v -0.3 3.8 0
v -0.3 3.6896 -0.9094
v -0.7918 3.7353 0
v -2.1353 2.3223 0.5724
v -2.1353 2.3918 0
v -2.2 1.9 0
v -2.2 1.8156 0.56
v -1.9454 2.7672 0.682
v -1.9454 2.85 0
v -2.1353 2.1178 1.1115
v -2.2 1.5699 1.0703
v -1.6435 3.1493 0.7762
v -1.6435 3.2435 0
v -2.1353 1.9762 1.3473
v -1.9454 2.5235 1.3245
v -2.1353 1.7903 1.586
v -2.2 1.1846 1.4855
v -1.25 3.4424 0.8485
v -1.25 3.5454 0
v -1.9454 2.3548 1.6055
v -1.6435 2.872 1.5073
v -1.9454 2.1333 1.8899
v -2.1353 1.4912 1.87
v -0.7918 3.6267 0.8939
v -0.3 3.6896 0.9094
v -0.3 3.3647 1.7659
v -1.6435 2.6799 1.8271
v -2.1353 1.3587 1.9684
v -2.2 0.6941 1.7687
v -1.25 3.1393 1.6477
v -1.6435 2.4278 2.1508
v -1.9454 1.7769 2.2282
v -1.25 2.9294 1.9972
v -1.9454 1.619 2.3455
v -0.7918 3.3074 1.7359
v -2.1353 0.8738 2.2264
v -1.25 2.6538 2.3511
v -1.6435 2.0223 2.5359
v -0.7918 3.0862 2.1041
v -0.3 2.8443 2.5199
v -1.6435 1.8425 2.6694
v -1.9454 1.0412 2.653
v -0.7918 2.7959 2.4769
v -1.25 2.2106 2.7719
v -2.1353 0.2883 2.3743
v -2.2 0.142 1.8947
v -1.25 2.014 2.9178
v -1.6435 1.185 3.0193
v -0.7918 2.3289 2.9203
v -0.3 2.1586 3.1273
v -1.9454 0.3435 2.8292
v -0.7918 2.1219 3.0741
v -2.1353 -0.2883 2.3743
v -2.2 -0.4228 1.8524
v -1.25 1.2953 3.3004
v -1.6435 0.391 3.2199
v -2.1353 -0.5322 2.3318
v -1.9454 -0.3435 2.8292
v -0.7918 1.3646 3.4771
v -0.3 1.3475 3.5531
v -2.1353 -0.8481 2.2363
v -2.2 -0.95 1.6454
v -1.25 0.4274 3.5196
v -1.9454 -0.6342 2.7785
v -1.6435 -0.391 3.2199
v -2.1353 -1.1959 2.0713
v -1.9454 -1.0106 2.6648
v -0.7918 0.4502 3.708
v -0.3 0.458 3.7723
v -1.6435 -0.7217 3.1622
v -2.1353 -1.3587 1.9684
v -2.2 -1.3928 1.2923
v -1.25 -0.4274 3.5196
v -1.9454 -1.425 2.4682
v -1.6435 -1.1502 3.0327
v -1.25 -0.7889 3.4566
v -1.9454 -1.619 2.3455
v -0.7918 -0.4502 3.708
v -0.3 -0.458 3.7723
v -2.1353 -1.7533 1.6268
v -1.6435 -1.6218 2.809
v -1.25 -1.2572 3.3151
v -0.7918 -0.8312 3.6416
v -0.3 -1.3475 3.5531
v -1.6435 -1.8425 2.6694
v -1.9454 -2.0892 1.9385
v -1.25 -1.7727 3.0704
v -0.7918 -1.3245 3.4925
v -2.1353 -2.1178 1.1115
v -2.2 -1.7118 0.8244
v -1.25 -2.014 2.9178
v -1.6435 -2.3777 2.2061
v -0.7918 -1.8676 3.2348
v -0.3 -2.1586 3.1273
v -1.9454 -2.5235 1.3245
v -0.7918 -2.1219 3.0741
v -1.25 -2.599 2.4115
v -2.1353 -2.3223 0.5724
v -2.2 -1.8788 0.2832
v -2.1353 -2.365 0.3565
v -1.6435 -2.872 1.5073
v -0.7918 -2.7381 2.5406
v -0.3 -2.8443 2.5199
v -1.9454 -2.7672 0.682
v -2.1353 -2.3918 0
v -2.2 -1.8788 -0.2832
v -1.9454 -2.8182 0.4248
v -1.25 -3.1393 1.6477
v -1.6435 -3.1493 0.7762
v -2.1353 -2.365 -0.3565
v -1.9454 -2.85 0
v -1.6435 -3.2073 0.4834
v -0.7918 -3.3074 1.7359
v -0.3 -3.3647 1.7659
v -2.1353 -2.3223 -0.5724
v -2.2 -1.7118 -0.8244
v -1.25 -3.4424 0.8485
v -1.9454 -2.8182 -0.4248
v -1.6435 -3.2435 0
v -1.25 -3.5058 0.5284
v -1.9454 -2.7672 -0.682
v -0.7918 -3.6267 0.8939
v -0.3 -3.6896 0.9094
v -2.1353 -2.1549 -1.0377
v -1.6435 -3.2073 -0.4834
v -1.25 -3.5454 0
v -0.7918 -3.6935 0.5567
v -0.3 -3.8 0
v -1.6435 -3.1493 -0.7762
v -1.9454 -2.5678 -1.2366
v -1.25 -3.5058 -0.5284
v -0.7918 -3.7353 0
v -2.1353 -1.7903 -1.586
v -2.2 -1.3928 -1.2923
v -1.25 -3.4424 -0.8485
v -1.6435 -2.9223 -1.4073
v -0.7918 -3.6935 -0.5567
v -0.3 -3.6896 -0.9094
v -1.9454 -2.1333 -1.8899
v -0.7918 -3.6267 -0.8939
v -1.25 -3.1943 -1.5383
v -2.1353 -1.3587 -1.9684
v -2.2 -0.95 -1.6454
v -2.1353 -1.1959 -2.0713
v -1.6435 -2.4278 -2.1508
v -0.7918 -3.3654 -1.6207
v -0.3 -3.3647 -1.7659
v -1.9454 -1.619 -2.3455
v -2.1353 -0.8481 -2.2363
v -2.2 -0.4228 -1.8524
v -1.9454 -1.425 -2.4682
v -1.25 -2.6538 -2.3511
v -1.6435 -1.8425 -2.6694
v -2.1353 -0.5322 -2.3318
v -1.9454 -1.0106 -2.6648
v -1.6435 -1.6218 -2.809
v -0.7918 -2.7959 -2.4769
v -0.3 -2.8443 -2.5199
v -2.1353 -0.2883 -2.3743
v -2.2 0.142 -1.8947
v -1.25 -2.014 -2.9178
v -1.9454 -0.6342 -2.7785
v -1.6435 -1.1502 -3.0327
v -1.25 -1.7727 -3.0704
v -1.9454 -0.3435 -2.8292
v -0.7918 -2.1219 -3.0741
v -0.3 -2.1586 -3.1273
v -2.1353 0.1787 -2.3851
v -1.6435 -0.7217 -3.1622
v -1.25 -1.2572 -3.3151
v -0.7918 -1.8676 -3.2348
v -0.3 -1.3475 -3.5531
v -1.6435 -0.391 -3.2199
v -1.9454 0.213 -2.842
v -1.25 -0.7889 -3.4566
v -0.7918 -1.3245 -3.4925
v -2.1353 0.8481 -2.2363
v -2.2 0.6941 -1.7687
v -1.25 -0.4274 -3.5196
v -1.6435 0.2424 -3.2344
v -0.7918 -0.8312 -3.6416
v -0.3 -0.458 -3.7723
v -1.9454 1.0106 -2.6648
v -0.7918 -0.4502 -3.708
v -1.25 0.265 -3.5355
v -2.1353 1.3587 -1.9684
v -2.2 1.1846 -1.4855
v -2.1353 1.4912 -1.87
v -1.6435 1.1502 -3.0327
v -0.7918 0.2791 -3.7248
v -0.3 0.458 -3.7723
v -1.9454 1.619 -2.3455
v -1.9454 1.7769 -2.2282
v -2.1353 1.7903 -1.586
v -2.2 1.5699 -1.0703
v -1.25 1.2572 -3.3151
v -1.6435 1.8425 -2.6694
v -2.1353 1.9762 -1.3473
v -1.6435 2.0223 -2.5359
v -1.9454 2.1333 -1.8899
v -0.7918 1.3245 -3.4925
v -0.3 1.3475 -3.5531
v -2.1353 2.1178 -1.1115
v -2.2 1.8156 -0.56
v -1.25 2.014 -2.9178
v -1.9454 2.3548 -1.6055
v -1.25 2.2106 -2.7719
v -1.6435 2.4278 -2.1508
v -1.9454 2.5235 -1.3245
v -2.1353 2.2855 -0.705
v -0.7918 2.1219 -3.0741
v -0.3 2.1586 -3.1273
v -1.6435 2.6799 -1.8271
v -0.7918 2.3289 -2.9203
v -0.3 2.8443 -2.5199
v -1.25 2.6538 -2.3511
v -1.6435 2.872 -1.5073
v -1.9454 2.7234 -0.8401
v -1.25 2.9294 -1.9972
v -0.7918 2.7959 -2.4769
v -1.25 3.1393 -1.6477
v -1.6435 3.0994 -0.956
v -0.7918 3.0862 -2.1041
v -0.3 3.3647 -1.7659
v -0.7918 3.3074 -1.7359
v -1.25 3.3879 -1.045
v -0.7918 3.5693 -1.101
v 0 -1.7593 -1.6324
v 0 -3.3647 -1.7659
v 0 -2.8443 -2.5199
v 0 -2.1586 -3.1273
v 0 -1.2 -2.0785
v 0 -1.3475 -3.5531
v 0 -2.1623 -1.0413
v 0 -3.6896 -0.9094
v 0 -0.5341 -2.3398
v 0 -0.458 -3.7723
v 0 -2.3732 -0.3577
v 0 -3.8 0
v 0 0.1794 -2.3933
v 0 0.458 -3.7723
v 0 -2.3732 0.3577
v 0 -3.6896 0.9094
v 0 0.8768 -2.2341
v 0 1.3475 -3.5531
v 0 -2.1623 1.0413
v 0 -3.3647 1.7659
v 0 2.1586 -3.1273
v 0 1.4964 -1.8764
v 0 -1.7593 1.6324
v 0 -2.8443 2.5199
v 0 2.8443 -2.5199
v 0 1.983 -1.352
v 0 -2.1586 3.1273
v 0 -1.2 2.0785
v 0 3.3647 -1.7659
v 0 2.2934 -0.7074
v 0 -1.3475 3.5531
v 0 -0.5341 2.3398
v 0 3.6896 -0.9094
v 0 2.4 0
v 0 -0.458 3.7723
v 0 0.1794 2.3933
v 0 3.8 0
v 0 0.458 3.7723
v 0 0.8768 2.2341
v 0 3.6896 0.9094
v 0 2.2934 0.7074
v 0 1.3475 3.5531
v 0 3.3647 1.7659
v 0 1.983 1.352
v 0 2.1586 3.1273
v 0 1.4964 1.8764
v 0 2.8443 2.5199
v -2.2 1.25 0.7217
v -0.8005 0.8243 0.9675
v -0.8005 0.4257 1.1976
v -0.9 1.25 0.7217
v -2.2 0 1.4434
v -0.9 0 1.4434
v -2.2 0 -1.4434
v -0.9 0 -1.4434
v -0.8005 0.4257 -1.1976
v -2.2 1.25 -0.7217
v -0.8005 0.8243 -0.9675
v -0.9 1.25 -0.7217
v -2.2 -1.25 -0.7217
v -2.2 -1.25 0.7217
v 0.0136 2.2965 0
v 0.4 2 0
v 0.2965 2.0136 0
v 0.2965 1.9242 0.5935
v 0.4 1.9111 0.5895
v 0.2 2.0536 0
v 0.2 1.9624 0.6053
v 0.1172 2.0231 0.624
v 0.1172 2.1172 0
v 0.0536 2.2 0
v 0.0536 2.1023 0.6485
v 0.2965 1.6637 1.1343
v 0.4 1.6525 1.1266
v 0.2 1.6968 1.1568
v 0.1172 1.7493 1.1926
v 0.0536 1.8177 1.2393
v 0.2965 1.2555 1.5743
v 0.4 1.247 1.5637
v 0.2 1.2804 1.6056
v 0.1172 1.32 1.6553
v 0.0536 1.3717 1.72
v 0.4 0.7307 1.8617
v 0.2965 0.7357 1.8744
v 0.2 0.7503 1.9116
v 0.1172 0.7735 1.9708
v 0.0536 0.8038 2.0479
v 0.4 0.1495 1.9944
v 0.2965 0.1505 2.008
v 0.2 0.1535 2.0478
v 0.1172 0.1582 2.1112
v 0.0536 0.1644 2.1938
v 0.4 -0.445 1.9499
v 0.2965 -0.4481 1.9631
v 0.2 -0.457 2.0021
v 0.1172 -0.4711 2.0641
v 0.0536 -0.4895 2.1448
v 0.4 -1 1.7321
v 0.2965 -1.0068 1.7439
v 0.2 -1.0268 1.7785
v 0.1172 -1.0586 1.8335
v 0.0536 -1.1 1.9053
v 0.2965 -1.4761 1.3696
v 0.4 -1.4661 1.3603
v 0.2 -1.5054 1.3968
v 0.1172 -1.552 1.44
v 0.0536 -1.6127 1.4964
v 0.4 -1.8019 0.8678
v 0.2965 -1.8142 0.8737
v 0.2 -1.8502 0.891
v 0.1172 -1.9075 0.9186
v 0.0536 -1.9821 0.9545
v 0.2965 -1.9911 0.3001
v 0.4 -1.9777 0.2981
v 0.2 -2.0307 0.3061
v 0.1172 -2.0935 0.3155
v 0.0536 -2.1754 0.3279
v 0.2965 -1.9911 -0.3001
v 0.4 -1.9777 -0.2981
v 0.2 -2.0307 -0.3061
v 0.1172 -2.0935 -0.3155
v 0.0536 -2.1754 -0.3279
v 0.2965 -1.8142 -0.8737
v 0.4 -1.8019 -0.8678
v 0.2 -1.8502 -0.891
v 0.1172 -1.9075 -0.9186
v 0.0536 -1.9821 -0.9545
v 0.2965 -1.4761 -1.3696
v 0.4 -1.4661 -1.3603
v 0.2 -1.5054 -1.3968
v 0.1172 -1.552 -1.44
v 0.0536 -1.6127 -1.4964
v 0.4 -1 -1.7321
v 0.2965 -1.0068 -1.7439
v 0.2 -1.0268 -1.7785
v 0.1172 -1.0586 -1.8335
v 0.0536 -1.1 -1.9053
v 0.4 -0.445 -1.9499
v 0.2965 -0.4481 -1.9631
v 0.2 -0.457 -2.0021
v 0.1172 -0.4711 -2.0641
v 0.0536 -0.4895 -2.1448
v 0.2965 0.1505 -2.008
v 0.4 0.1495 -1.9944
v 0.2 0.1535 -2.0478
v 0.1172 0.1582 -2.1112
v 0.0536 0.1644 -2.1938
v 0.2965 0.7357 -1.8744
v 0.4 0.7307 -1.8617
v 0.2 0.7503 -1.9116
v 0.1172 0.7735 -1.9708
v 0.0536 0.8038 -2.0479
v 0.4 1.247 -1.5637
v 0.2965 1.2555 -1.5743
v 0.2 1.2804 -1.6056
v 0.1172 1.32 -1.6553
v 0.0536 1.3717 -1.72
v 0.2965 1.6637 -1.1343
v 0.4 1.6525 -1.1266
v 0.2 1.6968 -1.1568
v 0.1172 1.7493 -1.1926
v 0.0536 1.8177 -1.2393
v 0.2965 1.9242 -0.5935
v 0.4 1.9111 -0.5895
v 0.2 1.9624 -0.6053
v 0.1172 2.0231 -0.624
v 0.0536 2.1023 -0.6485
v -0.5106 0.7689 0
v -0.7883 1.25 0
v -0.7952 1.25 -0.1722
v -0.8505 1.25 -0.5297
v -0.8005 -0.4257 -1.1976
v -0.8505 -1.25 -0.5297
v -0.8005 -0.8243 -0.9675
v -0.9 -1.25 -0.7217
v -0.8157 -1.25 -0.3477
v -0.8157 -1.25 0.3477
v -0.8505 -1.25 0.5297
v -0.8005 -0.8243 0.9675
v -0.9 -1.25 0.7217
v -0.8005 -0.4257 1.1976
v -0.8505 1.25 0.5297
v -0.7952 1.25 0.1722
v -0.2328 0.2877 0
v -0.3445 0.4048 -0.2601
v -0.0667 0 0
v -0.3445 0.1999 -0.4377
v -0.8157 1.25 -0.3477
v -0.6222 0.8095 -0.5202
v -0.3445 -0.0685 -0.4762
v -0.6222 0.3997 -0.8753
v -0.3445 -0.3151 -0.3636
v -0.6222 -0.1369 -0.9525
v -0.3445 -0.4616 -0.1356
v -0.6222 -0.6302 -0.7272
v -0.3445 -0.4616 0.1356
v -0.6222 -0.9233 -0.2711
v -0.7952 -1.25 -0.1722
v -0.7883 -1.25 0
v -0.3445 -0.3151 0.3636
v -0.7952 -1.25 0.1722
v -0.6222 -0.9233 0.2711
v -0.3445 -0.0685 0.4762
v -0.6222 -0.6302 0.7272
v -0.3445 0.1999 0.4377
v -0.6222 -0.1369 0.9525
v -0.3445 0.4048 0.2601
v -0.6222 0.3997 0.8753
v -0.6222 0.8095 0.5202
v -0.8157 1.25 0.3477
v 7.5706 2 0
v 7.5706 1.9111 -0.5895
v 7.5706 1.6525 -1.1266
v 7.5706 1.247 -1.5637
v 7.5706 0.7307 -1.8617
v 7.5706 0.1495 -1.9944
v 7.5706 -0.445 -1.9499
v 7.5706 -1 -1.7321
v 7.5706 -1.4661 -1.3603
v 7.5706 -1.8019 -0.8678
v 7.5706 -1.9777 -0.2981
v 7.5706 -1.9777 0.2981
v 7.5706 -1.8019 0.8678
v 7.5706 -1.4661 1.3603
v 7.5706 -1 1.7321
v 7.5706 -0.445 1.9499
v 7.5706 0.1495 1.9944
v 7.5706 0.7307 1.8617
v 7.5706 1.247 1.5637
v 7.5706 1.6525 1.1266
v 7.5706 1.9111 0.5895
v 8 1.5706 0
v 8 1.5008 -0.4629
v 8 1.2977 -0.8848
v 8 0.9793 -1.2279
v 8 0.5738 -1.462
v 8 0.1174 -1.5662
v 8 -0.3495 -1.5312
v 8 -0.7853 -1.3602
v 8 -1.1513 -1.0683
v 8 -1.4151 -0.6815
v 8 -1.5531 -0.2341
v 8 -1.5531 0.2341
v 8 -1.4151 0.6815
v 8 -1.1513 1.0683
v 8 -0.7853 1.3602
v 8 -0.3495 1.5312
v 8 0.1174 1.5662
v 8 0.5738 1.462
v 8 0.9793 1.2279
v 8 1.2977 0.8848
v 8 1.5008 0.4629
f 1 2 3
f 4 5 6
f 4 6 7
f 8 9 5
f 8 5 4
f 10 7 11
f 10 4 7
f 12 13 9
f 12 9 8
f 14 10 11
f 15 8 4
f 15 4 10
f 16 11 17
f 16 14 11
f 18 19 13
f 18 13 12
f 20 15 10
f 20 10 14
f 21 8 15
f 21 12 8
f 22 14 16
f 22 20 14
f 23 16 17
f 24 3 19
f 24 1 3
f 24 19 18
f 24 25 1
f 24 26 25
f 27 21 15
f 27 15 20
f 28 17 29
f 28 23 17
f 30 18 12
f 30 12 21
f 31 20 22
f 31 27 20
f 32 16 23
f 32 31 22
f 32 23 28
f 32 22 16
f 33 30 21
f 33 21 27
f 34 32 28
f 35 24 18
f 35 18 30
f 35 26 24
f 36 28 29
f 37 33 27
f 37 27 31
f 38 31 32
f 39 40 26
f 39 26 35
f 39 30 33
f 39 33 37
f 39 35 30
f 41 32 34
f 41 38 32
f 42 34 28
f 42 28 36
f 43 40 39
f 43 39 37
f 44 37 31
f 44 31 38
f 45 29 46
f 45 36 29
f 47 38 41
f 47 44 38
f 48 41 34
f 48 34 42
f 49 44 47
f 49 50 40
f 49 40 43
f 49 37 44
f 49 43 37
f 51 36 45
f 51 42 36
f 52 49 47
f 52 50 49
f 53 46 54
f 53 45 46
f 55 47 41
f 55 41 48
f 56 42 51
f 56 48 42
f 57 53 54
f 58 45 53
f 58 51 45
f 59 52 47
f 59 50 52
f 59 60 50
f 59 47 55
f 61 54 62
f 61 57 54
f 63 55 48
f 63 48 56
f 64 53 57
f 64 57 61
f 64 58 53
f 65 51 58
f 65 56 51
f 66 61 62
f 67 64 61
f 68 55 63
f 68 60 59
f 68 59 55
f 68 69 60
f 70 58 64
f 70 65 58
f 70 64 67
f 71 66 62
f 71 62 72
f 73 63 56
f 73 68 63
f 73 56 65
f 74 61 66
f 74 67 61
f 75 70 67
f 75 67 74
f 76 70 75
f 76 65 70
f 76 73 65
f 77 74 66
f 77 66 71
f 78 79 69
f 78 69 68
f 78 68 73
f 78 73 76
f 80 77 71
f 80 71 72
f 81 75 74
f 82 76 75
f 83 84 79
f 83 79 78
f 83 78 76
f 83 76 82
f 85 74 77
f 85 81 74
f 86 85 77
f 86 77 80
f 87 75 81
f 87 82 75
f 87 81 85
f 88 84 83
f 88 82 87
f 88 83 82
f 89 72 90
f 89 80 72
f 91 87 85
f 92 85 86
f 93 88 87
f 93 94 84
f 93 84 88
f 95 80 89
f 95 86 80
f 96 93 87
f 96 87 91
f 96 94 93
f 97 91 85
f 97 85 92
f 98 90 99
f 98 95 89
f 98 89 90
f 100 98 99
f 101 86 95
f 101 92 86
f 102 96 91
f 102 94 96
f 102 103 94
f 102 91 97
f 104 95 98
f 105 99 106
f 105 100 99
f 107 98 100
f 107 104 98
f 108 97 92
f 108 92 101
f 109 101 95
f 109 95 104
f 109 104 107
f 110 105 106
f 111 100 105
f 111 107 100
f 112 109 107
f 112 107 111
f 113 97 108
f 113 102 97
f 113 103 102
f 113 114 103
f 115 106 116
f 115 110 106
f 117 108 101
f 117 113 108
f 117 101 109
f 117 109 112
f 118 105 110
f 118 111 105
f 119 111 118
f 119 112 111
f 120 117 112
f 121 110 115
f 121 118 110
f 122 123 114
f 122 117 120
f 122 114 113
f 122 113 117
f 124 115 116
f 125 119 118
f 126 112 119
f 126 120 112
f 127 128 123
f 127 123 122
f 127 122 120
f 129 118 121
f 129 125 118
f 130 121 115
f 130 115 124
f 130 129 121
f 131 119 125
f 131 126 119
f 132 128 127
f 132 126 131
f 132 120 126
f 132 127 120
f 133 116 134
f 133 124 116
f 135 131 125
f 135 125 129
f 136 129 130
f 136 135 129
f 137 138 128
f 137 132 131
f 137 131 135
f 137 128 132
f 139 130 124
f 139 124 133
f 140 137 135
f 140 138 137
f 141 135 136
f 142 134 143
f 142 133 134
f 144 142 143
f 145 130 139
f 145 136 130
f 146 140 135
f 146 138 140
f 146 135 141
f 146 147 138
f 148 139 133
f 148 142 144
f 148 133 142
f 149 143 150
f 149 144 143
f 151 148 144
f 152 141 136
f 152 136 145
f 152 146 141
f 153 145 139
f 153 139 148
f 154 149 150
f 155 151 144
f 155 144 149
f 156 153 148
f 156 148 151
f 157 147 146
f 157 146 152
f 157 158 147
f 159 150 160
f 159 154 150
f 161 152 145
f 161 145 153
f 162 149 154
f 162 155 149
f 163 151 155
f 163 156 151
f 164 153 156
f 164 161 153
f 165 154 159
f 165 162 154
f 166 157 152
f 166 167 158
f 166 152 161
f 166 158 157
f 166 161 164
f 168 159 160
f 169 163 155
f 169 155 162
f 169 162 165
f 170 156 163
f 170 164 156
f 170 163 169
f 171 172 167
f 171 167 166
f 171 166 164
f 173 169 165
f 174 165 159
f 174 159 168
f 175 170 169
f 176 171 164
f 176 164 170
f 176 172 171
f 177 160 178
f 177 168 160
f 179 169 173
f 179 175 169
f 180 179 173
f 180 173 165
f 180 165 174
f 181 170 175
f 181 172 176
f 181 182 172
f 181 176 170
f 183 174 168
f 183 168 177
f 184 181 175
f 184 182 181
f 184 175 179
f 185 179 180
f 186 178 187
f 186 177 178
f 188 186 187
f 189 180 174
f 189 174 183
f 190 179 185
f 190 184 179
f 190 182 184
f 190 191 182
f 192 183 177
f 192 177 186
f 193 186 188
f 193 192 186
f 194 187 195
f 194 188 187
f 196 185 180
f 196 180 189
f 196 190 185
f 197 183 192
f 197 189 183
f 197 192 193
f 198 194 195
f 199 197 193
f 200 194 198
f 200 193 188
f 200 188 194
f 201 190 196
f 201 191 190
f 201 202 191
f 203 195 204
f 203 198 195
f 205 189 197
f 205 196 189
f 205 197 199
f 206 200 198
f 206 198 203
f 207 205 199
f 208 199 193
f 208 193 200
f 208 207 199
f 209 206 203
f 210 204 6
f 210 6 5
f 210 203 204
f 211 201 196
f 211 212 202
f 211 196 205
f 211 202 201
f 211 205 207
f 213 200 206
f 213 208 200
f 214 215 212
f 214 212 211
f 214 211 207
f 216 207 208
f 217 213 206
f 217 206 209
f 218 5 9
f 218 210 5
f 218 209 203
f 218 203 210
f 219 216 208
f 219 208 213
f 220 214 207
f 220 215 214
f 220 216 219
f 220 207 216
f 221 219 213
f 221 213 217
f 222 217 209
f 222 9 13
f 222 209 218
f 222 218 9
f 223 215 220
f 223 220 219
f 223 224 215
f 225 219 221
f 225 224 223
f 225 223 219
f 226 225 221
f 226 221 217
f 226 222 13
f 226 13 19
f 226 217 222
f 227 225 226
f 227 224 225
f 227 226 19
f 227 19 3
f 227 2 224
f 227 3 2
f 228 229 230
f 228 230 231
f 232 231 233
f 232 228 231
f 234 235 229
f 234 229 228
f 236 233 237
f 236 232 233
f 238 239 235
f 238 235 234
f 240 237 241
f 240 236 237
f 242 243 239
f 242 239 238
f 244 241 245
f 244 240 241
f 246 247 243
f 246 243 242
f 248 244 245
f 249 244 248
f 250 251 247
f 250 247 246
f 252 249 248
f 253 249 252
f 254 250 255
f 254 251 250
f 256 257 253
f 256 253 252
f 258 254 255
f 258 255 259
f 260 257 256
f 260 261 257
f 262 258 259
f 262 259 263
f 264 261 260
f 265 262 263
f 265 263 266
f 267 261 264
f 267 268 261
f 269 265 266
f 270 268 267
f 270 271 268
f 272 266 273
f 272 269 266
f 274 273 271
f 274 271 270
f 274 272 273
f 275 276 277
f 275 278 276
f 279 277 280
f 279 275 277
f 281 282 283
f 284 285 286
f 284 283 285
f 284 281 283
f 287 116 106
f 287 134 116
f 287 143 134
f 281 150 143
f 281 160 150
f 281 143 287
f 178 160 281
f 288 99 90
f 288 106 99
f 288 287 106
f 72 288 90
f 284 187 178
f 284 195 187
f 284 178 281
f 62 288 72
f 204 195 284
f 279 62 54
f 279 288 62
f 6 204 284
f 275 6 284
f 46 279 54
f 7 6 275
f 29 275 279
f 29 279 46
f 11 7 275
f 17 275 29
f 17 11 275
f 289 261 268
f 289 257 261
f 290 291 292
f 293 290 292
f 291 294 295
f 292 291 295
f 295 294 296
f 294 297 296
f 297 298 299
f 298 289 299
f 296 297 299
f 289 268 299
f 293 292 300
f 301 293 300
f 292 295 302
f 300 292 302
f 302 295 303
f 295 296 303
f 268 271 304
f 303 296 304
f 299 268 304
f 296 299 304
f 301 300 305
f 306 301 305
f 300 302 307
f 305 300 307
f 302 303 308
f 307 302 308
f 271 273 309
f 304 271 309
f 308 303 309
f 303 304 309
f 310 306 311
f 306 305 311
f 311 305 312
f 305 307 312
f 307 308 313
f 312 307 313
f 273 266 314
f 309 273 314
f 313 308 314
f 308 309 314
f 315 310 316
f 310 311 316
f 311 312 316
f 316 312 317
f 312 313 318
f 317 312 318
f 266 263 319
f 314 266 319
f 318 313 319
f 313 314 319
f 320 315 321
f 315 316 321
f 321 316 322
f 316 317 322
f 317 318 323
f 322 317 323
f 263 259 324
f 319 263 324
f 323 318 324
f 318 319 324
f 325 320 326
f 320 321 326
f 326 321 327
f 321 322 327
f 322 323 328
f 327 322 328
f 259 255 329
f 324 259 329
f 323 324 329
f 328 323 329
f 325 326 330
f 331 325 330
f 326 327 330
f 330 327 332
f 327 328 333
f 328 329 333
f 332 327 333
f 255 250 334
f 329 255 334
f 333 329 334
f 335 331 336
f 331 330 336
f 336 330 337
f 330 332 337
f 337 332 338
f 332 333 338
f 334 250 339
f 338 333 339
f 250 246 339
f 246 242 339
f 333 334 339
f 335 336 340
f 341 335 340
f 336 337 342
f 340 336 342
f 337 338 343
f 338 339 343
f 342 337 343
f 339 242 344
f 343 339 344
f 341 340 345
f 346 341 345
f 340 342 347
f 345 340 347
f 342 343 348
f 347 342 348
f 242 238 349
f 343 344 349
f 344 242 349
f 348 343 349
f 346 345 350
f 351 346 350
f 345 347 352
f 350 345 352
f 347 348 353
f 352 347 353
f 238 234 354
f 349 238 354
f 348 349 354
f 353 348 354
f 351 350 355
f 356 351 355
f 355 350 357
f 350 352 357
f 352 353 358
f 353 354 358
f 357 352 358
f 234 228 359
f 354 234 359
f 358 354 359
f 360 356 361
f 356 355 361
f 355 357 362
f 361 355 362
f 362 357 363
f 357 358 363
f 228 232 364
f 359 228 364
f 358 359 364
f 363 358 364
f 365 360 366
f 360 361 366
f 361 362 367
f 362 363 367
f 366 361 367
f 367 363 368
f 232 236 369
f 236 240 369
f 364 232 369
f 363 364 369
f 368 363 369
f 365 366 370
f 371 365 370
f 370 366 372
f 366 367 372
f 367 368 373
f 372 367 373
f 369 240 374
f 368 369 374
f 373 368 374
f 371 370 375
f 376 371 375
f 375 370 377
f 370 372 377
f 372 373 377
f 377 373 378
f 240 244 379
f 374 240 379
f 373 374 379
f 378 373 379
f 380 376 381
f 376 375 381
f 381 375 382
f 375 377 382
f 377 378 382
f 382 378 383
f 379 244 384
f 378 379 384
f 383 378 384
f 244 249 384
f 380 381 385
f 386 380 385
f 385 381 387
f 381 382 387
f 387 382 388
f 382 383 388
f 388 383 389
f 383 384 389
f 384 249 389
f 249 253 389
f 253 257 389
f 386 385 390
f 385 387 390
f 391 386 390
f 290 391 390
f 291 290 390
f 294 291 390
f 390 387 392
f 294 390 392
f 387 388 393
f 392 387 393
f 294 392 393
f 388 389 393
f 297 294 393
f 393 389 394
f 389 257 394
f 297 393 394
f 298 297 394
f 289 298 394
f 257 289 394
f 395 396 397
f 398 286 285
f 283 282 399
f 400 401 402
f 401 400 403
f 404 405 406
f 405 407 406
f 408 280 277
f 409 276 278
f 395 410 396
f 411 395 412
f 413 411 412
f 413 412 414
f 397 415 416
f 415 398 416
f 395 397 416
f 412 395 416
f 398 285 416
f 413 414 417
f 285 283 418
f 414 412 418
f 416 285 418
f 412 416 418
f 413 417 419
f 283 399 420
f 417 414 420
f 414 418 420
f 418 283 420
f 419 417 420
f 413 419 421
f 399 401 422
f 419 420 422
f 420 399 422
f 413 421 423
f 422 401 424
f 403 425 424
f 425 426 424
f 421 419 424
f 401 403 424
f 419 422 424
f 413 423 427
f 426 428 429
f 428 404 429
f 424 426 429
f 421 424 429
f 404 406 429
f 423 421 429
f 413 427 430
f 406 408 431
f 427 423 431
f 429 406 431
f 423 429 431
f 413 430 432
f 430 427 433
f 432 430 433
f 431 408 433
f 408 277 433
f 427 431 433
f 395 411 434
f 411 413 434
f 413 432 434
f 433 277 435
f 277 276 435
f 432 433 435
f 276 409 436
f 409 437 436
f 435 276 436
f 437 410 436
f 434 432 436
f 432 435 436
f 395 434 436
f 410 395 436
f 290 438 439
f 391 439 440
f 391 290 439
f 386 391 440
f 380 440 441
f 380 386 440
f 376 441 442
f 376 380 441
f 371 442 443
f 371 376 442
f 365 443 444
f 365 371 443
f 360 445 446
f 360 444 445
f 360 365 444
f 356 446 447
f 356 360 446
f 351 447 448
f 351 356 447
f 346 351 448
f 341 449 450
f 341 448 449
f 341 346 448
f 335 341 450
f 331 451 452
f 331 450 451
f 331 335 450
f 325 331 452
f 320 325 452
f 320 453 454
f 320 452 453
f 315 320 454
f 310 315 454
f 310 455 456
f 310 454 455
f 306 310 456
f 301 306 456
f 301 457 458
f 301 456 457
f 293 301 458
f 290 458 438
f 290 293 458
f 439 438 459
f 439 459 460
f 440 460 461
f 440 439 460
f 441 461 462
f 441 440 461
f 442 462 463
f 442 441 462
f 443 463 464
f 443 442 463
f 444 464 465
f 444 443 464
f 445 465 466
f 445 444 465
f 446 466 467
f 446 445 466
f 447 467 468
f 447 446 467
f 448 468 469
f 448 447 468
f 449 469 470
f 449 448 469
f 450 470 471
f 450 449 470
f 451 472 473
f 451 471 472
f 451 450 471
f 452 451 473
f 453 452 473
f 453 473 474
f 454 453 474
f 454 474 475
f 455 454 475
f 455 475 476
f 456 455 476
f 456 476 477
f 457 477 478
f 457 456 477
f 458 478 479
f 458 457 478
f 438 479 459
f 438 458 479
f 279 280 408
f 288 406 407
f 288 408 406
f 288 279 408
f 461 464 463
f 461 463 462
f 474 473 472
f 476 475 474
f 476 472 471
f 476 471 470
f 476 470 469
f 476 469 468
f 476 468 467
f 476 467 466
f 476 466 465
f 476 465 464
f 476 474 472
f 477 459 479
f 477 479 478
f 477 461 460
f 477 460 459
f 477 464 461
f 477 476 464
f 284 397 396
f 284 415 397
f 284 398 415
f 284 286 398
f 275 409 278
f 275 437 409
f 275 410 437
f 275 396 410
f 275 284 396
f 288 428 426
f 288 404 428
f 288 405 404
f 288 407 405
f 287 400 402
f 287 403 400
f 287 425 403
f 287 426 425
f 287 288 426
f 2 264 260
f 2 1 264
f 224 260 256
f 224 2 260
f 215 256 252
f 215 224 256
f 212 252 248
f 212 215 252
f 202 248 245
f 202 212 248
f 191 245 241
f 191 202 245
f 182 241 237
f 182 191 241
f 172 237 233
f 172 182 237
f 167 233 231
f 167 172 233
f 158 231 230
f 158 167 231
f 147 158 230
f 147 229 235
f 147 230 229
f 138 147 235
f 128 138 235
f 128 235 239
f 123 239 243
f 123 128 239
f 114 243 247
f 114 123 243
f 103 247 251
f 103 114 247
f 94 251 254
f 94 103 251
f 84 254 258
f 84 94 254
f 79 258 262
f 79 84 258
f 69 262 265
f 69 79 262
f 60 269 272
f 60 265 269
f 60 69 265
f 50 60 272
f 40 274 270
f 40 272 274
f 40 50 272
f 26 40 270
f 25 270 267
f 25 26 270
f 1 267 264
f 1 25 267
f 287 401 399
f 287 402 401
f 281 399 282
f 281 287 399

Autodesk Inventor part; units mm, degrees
ref_plane "YZ Plane" through (0, 0, 0) normal (1, 0, 0) x (0, 1, 0)
ref_plane "XZ Plane" through (0, 0, 0) normal (0, 1, 0) x (-1, 0, 0)
sketch "Sketch1" plane through (0, 0, 0) normal (0, 0, 1) x (1, 0, 0)
  line L0 (-0.0667, 0) -> (8, 0)
  line L1 (8, 0) -> (8, 2)
  line L2 (8, 2) -> (2.1, 2)
  line L3 (2.1, 2) -> (1.6705, 2)
  line L4 (1.6705, 2) -> (0, 2)
  line L5 (0, 2) -> (0, 3.8)
  line L6 (0, 3.8) -> (-2.2, 3.8)
  line L7 (-2.2, 3.8) -> (-2.2, 1.4434)
  line L8 (-2.2, 1.4434) -> (-0.9, 1.4434)
  line L9 (-0.9, 1.4434) -> (-0.0667, 0)
  line L10 (-4.24, 0) -> (10.04, 0) projected
  line L11 (0, -0.76) -> (0, 4.56) projected
  line L12 (2.1, 2) -> (0, 2) construction
  dimension "d1" = 5.9
  dimension "d2" = 0.4295
  dimension "d3" = 2.2
  dimension "d4" = 1.3
  dimension "d5" = 60
  dimension "d6" = 4
  dimension "d7" = 4
  dimension "d8" = 2.8868
  dimension "d9" = 7.6
  dimension "d26" = 8
revolve "Body" add sketch "Sketch1" angle 360 about axis through (-0.0667, 0, 0) along (1, 0, 0)
sketch "Sketch2" plane through (-2.2, 0, 0) normal (-1, 0, 0) x (0, 0, 1)
  circle A0 centre (0, 0) radius 1.4434 projected
  line L0 (0, -5.32) -> (0, 5.32) projected
  line L1 (-5.32, 0) -> (5.32, 0) projected
  line L2 (1.4434, 0) -> (0.7217, -1.25)
  line L3 (0.7217, -1.25) -> (-0.7217, -1.25)
  line L4 (-0.7217, -1.25) -> (-1.4434, 0)
  line L5 (-1.4434, 0) -> (-0.7217, 1.25)
  line L6 (-0.7217, 1.25) -> (0.7217, 1.25)
  line L7 (0.7217, 1.25) -> (1.4434, 0)
  point P0 (0, 0)
extrude "Slot" add sketch "Sketch2" against normal up to next contours L7 A0 | A0 L2 | L6 L0 A0 | A0 L0 L3 | L0 L6 A0 | A0 L3 L0 | L4 A0 | A0 L5
fillet "Fillet1" radius 1.9 1 edges at (-2.2, -3.8, 0)
thread "Thread" size "M4x0.7" class "6g" standard "ISO Metric profile" length 5.9
chamfer "Chamfer1" distance 0.4294 distance2 0.4294 1 edges at (8, -2, 0) measured on face at (8, 0.556, 0.0273)
ref_plane "Work Plane1" through (29, 0, 0) normal (0, -1, 0) x (1, 0, 0)
fillet "Fillet2" radius 0.4 1 edges at (0, -2, 0)
equation "\"d1\" = GEL"
equation "\"d3\" = KOH"
equation "\"d4\" = INTI"
equation "\"d6\" = GD"
equation "\"d7\" = BDM"
equation "\"d8\" = 1.1547 * SW"
equation "\"d9\" = KOD"
equation "\"d26\" = NLG"
equation "\"d30\" = R"
equation "\"d17\" = RR"
equation "\"d13\" = GEL"
equation "\"d15\" = -0.5 * SPD + 0.5 * GD"
equation "\"d16\" = GUL"
equation "\"GD\" = NND"
equation "\"NLG\" = 8"
equation "\"GEL\" = 5.9"
equation "\"KOD\" = 7.6"
equation "\"KOH\" = 2.2"
equation "\"INTI\" = 1.3"
equation "\"GAL\" = 0.61345 * PTC"
equation "\"GUL\" = 0.61345 * PTC"
equation "\"BDM\" = NND"
equation "\"SW\" = 2.5"
equation "\"RR\" = 1.9"
equation "\"SPD\" = NND - 1.2269 * PTC"
equation "\"R\" = 0.4"
equation "\"TOA\" = 30deg"
equation "\"GD1\" = THREADDIA - 1.2269 * PTC"
equation "\"THREADDIA\" = 4"
equation "\"PTC\" = 0.7"
equation "\"NND\" = 4"
equation "\"KOH1\" = 0.3"
equation "\"E0\" = 2.873"
properties part number "ISO 7380-1 - M4 x 8" material "Steel"
